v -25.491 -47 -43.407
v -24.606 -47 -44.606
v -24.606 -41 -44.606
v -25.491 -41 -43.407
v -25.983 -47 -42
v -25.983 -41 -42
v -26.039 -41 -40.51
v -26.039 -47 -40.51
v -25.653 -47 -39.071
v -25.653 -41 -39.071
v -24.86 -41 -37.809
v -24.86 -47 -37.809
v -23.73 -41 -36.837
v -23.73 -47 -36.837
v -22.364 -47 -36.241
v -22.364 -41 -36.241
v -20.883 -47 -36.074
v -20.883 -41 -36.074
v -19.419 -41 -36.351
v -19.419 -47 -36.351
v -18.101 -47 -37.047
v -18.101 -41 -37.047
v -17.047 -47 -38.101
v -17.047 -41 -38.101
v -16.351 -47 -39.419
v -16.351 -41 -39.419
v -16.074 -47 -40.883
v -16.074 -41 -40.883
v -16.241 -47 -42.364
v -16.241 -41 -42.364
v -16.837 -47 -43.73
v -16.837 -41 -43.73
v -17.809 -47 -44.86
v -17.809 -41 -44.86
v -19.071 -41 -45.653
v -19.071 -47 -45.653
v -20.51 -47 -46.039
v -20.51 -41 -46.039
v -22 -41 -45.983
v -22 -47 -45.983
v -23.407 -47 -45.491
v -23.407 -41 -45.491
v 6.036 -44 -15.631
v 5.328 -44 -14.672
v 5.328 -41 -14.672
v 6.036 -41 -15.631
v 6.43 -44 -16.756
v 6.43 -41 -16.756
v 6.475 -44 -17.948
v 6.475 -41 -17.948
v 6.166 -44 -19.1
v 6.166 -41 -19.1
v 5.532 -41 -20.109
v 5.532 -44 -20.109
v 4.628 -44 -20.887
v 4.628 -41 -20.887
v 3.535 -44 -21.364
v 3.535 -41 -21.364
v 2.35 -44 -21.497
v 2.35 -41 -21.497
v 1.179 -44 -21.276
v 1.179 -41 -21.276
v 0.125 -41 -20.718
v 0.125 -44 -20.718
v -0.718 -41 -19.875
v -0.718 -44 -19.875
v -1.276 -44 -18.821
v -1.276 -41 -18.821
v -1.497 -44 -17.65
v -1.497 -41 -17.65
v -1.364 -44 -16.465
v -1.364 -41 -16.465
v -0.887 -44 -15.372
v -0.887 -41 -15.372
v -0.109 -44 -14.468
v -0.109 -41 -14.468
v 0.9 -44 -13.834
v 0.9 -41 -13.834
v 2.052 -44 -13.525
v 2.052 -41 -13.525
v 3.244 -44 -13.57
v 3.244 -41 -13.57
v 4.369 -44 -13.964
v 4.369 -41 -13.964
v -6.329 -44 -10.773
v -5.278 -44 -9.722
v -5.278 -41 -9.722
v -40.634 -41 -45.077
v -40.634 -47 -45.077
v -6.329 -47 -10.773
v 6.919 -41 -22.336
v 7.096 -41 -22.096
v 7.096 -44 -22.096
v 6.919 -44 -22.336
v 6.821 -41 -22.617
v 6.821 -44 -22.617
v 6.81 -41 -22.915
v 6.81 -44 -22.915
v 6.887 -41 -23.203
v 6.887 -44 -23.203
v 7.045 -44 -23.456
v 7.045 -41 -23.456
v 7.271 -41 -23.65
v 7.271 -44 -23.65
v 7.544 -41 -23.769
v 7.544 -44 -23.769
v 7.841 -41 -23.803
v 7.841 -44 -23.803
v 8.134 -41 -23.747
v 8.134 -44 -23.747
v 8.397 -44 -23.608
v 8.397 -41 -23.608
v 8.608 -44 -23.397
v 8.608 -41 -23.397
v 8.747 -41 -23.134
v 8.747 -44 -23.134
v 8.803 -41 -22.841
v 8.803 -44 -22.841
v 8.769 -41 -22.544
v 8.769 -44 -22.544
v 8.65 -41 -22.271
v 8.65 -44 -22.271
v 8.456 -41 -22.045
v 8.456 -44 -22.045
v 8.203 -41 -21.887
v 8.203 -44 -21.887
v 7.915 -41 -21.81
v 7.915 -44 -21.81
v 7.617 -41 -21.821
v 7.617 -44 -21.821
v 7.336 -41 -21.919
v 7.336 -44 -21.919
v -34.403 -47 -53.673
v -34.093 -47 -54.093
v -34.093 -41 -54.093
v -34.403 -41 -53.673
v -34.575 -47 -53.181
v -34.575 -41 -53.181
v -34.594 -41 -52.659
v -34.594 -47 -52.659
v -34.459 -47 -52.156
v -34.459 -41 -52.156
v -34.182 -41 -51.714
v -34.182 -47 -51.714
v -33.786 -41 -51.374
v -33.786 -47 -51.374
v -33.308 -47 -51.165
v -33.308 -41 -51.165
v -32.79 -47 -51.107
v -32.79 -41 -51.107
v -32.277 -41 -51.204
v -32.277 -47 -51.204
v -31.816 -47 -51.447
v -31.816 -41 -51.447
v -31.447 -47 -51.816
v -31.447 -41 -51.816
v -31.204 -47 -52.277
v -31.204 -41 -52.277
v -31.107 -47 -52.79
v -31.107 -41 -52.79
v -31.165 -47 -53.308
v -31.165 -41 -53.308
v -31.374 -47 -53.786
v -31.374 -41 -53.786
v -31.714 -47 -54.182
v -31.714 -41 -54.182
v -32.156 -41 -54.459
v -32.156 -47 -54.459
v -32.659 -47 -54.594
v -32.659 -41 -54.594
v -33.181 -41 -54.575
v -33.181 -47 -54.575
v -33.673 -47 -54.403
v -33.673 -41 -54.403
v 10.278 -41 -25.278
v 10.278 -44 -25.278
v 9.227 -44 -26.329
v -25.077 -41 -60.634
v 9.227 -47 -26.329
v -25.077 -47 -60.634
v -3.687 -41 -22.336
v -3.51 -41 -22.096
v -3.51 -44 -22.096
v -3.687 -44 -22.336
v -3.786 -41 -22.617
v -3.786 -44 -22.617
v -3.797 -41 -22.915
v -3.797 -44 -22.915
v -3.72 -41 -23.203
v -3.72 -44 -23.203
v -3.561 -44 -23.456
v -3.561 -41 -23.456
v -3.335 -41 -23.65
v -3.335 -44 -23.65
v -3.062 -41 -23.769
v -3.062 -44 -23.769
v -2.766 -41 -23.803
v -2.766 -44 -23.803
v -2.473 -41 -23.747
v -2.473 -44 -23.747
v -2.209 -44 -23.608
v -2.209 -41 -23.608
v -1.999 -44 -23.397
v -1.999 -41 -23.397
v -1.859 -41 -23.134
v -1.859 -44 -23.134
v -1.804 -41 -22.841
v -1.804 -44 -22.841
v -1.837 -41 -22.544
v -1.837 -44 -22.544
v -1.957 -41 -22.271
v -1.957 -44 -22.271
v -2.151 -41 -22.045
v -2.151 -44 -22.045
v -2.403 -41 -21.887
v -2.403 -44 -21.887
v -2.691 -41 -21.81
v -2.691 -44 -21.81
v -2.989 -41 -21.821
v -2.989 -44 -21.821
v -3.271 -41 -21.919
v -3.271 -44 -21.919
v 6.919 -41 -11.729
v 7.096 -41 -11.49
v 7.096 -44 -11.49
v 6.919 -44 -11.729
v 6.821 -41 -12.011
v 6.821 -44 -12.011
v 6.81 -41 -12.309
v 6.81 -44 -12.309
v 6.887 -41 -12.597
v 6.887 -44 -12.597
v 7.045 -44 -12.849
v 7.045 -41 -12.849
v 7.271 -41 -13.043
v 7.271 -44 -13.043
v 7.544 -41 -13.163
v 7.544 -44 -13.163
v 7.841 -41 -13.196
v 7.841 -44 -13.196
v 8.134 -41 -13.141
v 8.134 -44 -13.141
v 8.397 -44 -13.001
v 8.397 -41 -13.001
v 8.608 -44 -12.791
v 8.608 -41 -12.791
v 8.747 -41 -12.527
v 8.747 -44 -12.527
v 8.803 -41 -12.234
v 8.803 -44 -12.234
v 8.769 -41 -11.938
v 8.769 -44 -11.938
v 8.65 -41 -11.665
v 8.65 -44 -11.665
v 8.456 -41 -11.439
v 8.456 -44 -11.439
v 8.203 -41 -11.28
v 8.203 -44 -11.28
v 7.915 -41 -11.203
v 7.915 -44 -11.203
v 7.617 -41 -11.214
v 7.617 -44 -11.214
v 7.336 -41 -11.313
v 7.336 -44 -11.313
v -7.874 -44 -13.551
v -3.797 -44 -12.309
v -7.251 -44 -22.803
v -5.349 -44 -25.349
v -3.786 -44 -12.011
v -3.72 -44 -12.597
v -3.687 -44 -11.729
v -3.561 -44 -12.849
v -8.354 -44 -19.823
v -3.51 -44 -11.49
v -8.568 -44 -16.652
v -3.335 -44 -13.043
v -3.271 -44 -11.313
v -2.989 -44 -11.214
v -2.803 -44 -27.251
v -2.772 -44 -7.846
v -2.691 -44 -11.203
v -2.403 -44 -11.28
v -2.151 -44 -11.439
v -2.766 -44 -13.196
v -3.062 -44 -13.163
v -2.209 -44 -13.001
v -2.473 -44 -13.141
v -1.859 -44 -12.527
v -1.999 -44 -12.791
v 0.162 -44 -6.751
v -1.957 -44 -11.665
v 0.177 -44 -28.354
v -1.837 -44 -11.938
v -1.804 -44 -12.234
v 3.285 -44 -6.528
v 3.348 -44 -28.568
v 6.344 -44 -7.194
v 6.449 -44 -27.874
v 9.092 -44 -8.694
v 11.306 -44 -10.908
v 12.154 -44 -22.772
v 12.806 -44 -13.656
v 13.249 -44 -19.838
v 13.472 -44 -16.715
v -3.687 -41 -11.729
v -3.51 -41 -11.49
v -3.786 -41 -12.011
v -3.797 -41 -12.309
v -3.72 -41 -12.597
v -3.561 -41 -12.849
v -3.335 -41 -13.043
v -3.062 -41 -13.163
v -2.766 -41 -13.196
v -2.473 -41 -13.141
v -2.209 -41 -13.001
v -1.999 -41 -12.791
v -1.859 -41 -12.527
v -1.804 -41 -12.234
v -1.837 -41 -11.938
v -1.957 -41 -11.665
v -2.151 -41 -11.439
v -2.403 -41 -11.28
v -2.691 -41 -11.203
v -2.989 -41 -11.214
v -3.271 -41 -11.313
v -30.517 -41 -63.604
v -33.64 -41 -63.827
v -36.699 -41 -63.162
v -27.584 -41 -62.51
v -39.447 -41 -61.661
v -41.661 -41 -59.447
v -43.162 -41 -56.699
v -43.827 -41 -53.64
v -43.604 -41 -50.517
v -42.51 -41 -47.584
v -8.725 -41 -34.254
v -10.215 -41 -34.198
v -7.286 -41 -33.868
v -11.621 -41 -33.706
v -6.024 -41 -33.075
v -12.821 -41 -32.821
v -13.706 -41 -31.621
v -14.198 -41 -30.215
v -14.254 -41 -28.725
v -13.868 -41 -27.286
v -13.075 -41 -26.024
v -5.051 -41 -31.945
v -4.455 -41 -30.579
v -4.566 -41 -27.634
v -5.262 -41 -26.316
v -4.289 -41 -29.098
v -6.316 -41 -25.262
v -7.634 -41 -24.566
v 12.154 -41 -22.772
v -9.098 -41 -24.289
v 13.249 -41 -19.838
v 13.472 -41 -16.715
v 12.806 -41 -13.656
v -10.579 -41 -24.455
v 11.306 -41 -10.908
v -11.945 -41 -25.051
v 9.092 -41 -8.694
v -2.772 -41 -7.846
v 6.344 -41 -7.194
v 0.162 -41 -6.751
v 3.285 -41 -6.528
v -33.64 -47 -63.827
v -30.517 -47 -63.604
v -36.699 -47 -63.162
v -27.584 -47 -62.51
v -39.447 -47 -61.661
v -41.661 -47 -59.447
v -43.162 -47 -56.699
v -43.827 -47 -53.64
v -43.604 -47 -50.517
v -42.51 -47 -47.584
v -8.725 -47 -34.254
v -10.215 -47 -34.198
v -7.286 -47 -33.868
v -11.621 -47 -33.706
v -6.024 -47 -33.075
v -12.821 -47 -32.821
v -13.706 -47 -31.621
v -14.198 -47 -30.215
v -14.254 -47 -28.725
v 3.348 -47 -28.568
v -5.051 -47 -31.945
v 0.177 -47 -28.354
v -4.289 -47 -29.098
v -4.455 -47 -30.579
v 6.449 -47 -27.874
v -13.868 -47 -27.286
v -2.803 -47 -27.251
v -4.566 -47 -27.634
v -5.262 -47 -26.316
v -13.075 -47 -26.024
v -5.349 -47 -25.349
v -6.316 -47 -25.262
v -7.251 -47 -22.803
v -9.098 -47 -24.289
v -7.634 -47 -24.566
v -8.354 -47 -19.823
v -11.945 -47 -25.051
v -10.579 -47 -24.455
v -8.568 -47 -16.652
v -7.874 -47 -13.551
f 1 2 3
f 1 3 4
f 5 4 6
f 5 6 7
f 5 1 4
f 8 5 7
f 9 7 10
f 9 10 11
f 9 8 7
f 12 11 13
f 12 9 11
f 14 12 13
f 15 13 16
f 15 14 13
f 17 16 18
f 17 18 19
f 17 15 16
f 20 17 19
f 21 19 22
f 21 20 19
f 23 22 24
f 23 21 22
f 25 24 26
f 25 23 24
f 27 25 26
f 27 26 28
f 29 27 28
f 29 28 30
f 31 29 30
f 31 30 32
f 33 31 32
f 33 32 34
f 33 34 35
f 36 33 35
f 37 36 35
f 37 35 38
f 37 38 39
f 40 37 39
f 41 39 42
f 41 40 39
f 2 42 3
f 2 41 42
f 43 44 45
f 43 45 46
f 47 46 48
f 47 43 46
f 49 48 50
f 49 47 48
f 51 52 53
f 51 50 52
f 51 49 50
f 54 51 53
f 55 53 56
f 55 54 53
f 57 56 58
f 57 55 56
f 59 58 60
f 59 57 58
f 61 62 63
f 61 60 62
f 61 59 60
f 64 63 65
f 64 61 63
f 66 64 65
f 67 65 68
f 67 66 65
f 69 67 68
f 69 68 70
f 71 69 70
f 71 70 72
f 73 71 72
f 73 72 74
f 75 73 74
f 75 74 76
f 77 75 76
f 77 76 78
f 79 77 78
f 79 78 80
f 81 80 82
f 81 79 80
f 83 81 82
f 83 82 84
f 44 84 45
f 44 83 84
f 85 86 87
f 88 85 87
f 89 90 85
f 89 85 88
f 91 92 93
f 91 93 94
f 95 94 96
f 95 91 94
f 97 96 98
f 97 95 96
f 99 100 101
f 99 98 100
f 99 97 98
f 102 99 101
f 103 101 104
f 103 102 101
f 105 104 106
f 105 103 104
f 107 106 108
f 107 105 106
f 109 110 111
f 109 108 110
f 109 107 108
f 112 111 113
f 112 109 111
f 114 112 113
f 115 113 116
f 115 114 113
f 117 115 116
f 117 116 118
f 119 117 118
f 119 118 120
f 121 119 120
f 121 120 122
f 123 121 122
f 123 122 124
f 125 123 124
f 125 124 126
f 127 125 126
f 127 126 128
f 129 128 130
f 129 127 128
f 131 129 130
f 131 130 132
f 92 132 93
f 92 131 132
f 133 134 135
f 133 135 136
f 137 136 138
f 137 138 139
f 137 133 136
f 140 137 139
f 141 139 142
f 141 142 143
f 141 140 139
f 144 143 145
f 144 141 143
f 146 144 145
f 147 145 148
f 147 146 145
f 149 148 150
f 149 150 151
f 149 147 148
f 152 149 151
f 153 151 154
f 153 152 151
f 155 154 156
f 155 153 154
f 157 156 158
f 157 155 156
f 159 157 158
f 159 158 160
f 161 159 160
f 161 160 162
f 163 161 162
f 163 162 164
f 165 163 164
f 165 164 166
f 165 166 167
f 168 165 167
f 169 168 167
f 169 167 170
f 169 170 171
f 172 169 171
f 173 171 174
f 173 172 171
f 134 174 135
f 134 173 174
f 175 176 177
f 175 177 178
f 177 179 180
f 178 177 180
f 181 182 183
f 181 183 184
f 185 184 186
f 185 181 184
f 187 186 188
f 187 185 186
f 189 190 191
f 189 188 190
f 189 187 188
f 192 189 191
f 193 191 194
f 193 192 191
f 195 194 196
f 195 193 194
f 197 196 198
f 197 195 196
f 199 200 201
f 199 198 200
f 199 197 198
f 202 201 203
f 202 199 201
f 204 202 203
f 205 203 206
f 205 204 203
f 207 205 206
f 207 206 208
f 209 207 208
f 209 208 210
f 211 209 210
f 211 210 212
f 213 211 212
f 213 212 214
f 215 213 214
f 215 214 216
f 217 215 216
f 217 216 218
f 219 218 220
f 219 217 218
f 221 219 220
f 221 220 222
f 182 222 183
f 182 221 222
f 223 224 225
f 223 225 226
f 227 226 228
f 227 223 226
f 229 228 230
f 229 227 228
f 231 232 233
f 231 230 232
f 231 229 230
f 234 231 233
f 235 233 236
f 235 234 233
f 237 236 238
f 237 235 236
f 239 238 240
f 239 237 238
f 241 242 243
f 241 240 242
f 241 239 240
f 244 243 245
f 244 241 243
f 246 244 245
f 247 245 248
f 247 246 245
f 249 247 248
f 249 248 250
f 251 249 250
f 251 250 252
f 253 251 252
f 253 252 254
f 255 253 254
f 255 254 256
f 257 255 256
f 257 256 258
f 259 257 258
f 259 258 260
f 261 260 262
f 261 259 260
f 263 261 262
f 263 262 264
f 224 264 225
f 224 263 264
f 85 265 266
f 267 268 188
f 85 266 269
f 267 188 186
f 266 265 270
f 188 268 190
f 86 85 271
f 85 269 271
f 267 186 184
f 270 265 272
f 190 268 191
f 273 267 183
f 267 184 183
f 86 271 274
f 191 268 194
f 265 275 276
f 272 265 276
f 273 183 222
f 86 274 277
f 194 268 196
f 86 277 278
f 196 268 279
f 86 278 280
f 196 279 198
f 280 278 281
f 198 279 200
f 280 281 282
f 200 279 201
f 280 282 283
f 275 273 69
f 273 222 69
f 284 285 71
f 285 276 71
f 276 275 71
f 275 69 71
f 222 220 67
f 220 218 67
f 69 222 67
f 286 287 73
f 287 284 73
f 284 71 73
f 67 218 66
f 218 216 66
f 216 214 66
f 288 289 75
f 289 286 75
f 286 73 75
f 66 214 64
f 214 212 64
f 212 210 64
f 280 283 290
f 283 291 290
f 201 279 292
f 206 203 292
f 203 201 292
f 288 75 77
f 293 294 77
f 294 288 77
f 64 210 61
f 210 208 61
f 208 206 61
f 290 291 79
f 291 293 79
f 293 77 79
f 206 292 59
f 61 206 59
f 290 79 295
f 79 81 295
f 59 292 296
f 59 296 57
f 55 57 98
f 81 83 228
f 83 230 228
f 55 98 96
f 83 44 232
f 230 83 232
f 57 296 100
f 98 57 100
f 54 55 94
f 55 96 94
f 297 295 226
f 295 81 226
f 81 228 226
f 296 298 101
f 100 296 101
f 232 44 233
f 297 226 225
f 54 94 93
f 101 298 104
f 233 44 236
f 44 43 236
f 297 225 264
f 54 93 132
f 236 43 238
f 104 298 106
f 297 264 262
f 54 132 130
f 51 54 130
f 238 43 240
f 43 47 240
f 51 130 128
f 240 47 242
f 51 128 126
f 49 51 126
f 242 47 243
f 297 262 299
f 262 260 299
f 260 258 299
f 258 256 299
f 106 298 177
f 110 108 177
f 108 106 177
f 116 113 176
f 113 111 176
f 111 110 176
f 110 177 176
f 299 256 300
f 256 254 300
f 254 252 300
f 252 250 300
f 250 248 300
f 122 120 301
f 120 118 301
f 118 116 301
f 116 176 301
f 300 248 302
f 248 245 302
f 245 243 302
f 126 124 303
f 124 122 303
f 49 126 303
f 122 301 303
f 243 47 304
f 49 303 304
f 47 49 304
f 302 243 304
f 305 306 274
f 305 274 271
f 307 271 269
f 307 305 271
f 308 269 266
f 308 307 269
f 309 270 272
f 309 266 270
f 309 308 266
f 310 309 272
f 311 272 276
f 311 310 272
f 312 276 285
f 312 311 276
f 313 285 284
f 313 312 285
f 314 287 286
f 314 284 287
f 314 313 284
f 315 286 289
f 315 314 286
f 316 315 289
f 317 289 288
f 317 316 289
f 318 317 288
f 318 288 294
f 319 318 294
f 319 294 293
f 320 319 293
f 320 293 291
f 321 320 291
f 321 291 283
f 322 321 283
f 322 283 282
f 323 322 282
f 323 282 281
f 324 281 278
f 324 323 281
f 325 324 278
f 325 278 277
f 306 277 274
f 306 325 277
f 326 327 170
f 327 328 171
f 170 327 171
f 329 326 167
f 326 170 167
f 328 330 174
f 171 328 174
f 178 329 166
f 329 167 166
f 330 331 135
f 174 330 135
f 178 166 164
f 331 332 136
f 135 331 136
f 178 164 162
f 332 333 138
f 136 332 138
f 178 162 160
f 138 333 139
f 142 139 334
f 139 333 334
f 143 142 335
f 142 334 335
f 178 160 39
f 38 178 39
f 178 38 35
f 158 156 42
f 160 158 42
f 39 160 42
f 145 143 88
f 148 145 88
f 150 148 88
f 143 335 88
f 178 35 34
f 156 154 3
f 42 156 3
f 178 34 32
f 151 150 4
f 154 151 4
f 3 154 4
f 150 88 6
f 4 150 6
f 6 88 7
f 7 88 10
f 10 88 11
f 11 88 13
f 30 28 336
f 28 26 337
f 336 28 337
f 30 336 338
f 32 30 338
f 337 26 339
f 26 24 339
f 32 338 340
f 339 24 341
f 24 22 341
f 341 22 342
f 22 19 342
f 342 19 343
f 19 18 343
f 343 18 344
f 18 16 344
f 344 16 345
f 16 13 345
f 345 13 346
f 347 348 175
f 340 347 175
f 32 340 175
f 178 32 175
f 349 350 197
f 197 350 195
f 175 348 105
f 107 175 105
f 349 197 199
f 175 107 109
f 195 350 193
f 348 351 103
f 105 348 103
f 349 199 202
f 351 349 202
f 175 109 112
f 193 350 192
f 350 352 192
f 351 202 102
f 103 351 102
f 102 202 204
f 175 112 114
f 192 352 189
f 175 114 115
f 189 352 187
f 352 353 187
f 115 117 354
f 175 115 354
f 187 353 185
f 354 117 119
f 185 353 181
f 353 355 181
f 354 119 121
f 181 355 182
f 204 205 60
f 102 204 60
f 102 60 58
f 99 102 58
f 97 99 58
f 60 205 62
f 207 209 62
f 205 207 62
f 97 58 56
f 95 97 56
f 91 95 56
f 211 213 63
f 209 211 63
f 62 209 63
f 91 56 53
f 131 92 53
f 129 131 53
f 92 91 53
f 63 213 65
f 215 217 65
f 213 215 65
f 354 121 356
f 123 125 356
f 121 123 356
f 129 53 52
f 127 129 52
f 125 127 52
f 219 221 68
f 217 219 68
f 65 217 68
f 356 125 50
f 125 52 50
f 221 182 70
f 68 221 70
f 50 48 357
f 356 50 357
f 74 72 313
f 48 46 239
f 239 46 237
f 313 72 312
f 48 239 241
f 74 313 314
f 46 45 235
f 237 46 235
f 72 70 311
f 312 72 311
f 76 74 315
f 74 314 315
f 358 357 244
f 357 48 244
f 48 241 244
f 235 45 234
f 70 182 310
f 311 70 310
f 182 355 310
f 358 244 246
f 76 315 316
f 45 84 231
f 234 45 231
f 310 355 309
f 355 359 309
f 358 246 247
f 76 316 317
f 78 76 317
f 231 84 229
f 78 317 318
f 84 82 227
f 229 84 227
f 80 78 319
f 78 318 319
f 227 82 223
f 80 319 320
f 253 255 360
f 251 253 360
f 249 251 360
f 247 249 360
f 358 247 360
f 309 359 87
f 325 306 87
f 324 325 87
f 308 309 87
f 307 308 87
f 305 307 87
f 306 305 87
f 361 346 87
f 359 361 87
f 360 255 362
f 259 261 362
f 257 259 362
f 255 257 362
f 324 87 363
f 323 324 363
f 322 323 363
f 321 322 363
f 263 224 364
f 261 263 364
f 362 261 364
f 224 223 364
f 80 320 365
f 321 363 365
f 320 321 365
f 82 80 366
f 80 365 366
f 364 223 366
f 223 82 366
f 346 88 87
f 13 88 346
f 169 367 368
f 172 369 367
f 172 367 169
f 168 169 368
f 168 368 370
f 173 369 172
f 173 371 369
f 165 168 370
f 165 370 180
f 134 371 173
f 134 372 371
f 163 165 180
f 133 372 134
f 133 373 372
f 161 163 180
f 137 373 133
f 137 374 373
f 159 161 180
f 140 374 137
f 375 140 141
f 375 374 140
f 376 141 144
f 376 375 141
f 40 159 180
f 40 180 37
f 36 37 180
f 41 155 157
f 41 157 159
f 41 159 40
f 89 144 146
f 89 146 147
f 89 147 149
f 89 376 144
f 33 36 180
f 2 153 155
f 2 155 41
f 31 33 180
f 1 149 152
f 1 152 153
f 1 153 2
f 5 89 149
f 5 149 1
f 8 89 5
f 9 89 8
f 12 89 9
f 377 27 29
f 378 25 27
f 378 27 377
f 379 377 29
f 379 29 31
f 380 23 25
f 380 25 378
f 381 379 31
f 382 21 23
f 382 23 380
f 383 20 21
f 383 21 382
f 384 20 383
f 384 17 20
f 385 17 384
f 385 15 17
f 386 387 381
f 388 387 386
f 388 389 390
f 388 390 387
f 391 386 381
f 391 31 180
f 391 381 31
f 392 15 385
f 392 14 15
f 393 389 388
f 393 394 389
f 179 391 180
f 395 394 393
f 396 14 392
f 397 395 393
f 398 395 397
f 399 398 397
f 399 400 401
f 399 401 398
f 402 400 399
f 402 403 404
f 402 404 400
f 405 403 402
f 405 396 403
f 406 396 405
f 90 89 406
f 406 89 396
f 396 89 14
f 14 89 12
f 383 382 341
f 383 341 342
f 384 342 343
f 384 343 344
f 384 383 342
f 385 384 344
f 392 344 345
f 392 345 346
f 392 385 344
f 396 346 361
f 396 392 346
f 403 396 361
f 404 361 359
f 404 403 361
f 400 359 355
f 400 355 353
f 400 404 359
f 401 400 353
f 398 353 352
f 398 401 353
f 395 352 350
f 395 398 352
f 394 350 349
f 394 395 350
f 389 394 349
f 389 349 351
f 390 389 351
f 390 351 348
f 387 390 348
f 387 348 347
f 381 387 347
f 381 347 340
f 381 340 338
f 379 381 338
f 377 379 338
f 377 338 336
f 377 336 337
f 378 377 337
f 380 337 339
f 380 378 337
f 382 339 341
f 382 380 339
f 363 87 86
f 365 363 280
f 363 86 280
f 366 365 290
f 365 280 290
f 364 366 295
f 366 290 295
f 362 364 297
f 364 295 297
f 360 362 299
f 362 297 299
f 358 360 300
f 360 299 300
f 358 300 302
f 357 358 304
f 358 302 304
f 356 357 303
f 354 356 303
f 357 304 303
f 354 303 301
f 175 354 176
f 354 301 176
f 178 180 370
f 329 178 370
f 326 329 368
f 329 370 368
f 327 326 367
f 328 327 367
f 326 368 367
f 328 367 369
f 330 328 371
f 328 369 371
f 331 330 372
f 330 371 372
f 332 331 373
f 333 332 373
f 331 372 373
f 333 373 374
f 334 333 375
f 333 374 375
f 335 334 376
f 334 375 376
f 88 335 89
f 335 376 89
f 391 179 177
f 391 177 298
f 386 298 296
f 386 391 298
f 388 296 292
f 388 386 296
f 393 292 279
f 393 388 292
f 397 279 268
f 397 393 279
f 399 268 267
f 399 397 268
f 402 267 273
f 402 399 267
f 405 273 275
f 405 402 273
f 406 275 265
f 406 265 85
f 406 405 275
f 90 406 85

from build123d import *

# Parameters (mm, degrees)
CYLINDER020_R             = 11.1
CYLINDER020_DEPTH         = 26
CYLINDER019_R             = 4
CYLINDER019_DEPTH         = 43
CYLINDER021_R             = 1
CYLINDER021_DEPTH         = 31
CYLINDER024_R             = 1
CYLINDER024_DEPTH         = 31
CYLINDER023_R             = 1
CYLINDER023_DEPTH         = 31
CYLINDER022_R             = 1
CYLINDER022_DEPTH         = 31
FUSION002_ROLL_ANGLE      = -90
FUSION003_PLACEMENT_ANGLE = 180
SKETCH_R                  = 5
SKETCH_R_2                = 1.75
PAD_DEPTH                 = 6
CUT_PITCH_ANGLE           = 90
CLONE017_PITCH_ANGLE      = -45


with BuildPart() as cylinder141:
    # Cylinder020 → Cylinder020 (new body)
    with BuildSketch(Plane(origin=(-3, 71, 73), x_dir=(0, 0, 1), z_dir=(0, -1, 0))):
        Circle(CYLINDER020_R)
    extrude(amount=CYLINDER020_DEPTH)


with BuildPart() as fusion001:
    # Cylinder019 → Cylinder019 (new body)
    with BuildSketch(Plane(origin=(-3, 66, 73), x_dir=(0, 0, 1), z_dir=(0, -1, 0))):
        Circle(CYLINDER019_R)
    extrude(amount=CYLINDER019_DEPTH)

    # Fusion001: union Cylinder141
    add(cylinder141.part)


with BuildPart() as cylinder096:
    # Cylinder021 → Cylinder021 (new body)
    with BuildSketch(Plane(origin=(-7.5, -11, 132), x_dir=(1, 0, 0), z_dir=(0, 0, 1))):
        Circle(CYLINDER021_R)
    extrude(amount=CYLINDER021_DEPTH)


with BuildPart() as cylinder146:
    # Cylinder024 → Cylinder024 (new body)
    with BuildSketch(Plane(origin=(0, -3.5, 132), x_dir=(1, 0, 0), z_dir=(0, 0, 1))):
        Circle(CYLINDER024_R)
    extrude(amount=CYLINDER024_DEPTH)


with BuildPart() as cylinder145:
    # Cylinder023 → Cylinder023 (new body)
    with BuildSketch(Plane(origin=(7.5, -11, 132), x_dir=(1, 0, 0), z_dir=(0, 0, 1))):
        Circle(CYLINDER023_R)
    extrude(amount=CYLINDER023_DEPTH)


with BuildPart() as fusion003:
    # Cylinder022 → Cylinder022 (new body)
    with BuildSketch(Plane(origin=(0, -18.5, 132), x_dir=(1, 0, 0), z_dir=(0, 0, 1))):
        Circle(CYLINDER022_R)
    extrude(amount=CYLINDER022_DEPTH)

    # Fusion002: union Cylinder096, Cylinder146, Cylinder145
    add(cylinder096.part)
    add(cylinder146.part)
    add(cylinder145.part)


with BuildPart() as fusion003_1:
    # Fusion002 roll: moved
    add(fusion003.part.rotate(Axis((0, 0, 0), (1, 0, 0)), FUSION002_ROLL_ANGLE))


with BuildPart() as fusion003_2:
    # Fusion002 placement: moved
    add(fusion003_1.part.moved(Location((-3, -97.5, 62))))

    # Fusion003: union Fusion001
    add(fusion001.part)


with BuildPart() as fusion003_3:
    # Fusion003 placement: moved
    add(fusion003_2.part.moved(Location((-0.5, 88, -87))).rotate(Axis((-0.5, 88, -87), (0, 0, 1)), FUSION003_PLACEMENT_ANGLE))


with BuildPart() as clone_of_cut001:
    # Sketch → Pad (new body)
    with BuildSketch(Plane(origin=(-11.5, 40, -16.5), x_dir=(0, 0, -1), z_dir=(0, 1, 0))):
        with BuildLine():
            Line((-2.5, -3), (47.5, -3))
            ThreePointArc((47.5, -25), (58.5, -14), (47.5, -3))
            Line((-2.5, -25), (47.5, -25))
            ThreePointArc((-2.5, -3), (-13.5, -14), (-2.5, -25))
        make_face()
        with Locations((14.166667, -14)):
            Circle(SKETCH_R, mode=Mode.SUBTRACT)
        with Locations((30.833333, -14)):
            Circle(SKETCH_R, mode=Mode.SUBTRACT)
        with Locations((47.5, -14)):
            Circle(SKETCH_R_2, mode=Mode.SUBTRACT)
    extrude(amount=PAD_DEPTH)

    # Cut: cut Fusion003
    add(fusion003_3.part, mode=Mode.SUBTRACT)


with BuildPart() as clone_of_cut001_1:
    # Cut pitch: moved
    add(clone_of_cut001.part.rotate(Axis((0, 0, 0), (0, 1, 0)), CUT_PITCH_ANGLE))


with BuildPart() as clone_of_cut001_2:
    # Cut placement: moved
    add(clone_of_cut001_1.part.moved(Location((16.5, -87, -15))))


with BuildPart() as clone_of_cut001_3:
    # Clone017 pitch: moved
    add(clone_of_cut001_2.part.rotate(Axis((0, 0, 0), (0, 1, 0)), CLONE017_PITCH_ANGLE))


with BuildPart() as clone_of_cut001_4:
    # Clone017 placement: moved
    add(clone_of_cut001_3.part.moved(Location((-11.642136, 0, -6.893398))))


solid = clone_of_cut001_4.part
